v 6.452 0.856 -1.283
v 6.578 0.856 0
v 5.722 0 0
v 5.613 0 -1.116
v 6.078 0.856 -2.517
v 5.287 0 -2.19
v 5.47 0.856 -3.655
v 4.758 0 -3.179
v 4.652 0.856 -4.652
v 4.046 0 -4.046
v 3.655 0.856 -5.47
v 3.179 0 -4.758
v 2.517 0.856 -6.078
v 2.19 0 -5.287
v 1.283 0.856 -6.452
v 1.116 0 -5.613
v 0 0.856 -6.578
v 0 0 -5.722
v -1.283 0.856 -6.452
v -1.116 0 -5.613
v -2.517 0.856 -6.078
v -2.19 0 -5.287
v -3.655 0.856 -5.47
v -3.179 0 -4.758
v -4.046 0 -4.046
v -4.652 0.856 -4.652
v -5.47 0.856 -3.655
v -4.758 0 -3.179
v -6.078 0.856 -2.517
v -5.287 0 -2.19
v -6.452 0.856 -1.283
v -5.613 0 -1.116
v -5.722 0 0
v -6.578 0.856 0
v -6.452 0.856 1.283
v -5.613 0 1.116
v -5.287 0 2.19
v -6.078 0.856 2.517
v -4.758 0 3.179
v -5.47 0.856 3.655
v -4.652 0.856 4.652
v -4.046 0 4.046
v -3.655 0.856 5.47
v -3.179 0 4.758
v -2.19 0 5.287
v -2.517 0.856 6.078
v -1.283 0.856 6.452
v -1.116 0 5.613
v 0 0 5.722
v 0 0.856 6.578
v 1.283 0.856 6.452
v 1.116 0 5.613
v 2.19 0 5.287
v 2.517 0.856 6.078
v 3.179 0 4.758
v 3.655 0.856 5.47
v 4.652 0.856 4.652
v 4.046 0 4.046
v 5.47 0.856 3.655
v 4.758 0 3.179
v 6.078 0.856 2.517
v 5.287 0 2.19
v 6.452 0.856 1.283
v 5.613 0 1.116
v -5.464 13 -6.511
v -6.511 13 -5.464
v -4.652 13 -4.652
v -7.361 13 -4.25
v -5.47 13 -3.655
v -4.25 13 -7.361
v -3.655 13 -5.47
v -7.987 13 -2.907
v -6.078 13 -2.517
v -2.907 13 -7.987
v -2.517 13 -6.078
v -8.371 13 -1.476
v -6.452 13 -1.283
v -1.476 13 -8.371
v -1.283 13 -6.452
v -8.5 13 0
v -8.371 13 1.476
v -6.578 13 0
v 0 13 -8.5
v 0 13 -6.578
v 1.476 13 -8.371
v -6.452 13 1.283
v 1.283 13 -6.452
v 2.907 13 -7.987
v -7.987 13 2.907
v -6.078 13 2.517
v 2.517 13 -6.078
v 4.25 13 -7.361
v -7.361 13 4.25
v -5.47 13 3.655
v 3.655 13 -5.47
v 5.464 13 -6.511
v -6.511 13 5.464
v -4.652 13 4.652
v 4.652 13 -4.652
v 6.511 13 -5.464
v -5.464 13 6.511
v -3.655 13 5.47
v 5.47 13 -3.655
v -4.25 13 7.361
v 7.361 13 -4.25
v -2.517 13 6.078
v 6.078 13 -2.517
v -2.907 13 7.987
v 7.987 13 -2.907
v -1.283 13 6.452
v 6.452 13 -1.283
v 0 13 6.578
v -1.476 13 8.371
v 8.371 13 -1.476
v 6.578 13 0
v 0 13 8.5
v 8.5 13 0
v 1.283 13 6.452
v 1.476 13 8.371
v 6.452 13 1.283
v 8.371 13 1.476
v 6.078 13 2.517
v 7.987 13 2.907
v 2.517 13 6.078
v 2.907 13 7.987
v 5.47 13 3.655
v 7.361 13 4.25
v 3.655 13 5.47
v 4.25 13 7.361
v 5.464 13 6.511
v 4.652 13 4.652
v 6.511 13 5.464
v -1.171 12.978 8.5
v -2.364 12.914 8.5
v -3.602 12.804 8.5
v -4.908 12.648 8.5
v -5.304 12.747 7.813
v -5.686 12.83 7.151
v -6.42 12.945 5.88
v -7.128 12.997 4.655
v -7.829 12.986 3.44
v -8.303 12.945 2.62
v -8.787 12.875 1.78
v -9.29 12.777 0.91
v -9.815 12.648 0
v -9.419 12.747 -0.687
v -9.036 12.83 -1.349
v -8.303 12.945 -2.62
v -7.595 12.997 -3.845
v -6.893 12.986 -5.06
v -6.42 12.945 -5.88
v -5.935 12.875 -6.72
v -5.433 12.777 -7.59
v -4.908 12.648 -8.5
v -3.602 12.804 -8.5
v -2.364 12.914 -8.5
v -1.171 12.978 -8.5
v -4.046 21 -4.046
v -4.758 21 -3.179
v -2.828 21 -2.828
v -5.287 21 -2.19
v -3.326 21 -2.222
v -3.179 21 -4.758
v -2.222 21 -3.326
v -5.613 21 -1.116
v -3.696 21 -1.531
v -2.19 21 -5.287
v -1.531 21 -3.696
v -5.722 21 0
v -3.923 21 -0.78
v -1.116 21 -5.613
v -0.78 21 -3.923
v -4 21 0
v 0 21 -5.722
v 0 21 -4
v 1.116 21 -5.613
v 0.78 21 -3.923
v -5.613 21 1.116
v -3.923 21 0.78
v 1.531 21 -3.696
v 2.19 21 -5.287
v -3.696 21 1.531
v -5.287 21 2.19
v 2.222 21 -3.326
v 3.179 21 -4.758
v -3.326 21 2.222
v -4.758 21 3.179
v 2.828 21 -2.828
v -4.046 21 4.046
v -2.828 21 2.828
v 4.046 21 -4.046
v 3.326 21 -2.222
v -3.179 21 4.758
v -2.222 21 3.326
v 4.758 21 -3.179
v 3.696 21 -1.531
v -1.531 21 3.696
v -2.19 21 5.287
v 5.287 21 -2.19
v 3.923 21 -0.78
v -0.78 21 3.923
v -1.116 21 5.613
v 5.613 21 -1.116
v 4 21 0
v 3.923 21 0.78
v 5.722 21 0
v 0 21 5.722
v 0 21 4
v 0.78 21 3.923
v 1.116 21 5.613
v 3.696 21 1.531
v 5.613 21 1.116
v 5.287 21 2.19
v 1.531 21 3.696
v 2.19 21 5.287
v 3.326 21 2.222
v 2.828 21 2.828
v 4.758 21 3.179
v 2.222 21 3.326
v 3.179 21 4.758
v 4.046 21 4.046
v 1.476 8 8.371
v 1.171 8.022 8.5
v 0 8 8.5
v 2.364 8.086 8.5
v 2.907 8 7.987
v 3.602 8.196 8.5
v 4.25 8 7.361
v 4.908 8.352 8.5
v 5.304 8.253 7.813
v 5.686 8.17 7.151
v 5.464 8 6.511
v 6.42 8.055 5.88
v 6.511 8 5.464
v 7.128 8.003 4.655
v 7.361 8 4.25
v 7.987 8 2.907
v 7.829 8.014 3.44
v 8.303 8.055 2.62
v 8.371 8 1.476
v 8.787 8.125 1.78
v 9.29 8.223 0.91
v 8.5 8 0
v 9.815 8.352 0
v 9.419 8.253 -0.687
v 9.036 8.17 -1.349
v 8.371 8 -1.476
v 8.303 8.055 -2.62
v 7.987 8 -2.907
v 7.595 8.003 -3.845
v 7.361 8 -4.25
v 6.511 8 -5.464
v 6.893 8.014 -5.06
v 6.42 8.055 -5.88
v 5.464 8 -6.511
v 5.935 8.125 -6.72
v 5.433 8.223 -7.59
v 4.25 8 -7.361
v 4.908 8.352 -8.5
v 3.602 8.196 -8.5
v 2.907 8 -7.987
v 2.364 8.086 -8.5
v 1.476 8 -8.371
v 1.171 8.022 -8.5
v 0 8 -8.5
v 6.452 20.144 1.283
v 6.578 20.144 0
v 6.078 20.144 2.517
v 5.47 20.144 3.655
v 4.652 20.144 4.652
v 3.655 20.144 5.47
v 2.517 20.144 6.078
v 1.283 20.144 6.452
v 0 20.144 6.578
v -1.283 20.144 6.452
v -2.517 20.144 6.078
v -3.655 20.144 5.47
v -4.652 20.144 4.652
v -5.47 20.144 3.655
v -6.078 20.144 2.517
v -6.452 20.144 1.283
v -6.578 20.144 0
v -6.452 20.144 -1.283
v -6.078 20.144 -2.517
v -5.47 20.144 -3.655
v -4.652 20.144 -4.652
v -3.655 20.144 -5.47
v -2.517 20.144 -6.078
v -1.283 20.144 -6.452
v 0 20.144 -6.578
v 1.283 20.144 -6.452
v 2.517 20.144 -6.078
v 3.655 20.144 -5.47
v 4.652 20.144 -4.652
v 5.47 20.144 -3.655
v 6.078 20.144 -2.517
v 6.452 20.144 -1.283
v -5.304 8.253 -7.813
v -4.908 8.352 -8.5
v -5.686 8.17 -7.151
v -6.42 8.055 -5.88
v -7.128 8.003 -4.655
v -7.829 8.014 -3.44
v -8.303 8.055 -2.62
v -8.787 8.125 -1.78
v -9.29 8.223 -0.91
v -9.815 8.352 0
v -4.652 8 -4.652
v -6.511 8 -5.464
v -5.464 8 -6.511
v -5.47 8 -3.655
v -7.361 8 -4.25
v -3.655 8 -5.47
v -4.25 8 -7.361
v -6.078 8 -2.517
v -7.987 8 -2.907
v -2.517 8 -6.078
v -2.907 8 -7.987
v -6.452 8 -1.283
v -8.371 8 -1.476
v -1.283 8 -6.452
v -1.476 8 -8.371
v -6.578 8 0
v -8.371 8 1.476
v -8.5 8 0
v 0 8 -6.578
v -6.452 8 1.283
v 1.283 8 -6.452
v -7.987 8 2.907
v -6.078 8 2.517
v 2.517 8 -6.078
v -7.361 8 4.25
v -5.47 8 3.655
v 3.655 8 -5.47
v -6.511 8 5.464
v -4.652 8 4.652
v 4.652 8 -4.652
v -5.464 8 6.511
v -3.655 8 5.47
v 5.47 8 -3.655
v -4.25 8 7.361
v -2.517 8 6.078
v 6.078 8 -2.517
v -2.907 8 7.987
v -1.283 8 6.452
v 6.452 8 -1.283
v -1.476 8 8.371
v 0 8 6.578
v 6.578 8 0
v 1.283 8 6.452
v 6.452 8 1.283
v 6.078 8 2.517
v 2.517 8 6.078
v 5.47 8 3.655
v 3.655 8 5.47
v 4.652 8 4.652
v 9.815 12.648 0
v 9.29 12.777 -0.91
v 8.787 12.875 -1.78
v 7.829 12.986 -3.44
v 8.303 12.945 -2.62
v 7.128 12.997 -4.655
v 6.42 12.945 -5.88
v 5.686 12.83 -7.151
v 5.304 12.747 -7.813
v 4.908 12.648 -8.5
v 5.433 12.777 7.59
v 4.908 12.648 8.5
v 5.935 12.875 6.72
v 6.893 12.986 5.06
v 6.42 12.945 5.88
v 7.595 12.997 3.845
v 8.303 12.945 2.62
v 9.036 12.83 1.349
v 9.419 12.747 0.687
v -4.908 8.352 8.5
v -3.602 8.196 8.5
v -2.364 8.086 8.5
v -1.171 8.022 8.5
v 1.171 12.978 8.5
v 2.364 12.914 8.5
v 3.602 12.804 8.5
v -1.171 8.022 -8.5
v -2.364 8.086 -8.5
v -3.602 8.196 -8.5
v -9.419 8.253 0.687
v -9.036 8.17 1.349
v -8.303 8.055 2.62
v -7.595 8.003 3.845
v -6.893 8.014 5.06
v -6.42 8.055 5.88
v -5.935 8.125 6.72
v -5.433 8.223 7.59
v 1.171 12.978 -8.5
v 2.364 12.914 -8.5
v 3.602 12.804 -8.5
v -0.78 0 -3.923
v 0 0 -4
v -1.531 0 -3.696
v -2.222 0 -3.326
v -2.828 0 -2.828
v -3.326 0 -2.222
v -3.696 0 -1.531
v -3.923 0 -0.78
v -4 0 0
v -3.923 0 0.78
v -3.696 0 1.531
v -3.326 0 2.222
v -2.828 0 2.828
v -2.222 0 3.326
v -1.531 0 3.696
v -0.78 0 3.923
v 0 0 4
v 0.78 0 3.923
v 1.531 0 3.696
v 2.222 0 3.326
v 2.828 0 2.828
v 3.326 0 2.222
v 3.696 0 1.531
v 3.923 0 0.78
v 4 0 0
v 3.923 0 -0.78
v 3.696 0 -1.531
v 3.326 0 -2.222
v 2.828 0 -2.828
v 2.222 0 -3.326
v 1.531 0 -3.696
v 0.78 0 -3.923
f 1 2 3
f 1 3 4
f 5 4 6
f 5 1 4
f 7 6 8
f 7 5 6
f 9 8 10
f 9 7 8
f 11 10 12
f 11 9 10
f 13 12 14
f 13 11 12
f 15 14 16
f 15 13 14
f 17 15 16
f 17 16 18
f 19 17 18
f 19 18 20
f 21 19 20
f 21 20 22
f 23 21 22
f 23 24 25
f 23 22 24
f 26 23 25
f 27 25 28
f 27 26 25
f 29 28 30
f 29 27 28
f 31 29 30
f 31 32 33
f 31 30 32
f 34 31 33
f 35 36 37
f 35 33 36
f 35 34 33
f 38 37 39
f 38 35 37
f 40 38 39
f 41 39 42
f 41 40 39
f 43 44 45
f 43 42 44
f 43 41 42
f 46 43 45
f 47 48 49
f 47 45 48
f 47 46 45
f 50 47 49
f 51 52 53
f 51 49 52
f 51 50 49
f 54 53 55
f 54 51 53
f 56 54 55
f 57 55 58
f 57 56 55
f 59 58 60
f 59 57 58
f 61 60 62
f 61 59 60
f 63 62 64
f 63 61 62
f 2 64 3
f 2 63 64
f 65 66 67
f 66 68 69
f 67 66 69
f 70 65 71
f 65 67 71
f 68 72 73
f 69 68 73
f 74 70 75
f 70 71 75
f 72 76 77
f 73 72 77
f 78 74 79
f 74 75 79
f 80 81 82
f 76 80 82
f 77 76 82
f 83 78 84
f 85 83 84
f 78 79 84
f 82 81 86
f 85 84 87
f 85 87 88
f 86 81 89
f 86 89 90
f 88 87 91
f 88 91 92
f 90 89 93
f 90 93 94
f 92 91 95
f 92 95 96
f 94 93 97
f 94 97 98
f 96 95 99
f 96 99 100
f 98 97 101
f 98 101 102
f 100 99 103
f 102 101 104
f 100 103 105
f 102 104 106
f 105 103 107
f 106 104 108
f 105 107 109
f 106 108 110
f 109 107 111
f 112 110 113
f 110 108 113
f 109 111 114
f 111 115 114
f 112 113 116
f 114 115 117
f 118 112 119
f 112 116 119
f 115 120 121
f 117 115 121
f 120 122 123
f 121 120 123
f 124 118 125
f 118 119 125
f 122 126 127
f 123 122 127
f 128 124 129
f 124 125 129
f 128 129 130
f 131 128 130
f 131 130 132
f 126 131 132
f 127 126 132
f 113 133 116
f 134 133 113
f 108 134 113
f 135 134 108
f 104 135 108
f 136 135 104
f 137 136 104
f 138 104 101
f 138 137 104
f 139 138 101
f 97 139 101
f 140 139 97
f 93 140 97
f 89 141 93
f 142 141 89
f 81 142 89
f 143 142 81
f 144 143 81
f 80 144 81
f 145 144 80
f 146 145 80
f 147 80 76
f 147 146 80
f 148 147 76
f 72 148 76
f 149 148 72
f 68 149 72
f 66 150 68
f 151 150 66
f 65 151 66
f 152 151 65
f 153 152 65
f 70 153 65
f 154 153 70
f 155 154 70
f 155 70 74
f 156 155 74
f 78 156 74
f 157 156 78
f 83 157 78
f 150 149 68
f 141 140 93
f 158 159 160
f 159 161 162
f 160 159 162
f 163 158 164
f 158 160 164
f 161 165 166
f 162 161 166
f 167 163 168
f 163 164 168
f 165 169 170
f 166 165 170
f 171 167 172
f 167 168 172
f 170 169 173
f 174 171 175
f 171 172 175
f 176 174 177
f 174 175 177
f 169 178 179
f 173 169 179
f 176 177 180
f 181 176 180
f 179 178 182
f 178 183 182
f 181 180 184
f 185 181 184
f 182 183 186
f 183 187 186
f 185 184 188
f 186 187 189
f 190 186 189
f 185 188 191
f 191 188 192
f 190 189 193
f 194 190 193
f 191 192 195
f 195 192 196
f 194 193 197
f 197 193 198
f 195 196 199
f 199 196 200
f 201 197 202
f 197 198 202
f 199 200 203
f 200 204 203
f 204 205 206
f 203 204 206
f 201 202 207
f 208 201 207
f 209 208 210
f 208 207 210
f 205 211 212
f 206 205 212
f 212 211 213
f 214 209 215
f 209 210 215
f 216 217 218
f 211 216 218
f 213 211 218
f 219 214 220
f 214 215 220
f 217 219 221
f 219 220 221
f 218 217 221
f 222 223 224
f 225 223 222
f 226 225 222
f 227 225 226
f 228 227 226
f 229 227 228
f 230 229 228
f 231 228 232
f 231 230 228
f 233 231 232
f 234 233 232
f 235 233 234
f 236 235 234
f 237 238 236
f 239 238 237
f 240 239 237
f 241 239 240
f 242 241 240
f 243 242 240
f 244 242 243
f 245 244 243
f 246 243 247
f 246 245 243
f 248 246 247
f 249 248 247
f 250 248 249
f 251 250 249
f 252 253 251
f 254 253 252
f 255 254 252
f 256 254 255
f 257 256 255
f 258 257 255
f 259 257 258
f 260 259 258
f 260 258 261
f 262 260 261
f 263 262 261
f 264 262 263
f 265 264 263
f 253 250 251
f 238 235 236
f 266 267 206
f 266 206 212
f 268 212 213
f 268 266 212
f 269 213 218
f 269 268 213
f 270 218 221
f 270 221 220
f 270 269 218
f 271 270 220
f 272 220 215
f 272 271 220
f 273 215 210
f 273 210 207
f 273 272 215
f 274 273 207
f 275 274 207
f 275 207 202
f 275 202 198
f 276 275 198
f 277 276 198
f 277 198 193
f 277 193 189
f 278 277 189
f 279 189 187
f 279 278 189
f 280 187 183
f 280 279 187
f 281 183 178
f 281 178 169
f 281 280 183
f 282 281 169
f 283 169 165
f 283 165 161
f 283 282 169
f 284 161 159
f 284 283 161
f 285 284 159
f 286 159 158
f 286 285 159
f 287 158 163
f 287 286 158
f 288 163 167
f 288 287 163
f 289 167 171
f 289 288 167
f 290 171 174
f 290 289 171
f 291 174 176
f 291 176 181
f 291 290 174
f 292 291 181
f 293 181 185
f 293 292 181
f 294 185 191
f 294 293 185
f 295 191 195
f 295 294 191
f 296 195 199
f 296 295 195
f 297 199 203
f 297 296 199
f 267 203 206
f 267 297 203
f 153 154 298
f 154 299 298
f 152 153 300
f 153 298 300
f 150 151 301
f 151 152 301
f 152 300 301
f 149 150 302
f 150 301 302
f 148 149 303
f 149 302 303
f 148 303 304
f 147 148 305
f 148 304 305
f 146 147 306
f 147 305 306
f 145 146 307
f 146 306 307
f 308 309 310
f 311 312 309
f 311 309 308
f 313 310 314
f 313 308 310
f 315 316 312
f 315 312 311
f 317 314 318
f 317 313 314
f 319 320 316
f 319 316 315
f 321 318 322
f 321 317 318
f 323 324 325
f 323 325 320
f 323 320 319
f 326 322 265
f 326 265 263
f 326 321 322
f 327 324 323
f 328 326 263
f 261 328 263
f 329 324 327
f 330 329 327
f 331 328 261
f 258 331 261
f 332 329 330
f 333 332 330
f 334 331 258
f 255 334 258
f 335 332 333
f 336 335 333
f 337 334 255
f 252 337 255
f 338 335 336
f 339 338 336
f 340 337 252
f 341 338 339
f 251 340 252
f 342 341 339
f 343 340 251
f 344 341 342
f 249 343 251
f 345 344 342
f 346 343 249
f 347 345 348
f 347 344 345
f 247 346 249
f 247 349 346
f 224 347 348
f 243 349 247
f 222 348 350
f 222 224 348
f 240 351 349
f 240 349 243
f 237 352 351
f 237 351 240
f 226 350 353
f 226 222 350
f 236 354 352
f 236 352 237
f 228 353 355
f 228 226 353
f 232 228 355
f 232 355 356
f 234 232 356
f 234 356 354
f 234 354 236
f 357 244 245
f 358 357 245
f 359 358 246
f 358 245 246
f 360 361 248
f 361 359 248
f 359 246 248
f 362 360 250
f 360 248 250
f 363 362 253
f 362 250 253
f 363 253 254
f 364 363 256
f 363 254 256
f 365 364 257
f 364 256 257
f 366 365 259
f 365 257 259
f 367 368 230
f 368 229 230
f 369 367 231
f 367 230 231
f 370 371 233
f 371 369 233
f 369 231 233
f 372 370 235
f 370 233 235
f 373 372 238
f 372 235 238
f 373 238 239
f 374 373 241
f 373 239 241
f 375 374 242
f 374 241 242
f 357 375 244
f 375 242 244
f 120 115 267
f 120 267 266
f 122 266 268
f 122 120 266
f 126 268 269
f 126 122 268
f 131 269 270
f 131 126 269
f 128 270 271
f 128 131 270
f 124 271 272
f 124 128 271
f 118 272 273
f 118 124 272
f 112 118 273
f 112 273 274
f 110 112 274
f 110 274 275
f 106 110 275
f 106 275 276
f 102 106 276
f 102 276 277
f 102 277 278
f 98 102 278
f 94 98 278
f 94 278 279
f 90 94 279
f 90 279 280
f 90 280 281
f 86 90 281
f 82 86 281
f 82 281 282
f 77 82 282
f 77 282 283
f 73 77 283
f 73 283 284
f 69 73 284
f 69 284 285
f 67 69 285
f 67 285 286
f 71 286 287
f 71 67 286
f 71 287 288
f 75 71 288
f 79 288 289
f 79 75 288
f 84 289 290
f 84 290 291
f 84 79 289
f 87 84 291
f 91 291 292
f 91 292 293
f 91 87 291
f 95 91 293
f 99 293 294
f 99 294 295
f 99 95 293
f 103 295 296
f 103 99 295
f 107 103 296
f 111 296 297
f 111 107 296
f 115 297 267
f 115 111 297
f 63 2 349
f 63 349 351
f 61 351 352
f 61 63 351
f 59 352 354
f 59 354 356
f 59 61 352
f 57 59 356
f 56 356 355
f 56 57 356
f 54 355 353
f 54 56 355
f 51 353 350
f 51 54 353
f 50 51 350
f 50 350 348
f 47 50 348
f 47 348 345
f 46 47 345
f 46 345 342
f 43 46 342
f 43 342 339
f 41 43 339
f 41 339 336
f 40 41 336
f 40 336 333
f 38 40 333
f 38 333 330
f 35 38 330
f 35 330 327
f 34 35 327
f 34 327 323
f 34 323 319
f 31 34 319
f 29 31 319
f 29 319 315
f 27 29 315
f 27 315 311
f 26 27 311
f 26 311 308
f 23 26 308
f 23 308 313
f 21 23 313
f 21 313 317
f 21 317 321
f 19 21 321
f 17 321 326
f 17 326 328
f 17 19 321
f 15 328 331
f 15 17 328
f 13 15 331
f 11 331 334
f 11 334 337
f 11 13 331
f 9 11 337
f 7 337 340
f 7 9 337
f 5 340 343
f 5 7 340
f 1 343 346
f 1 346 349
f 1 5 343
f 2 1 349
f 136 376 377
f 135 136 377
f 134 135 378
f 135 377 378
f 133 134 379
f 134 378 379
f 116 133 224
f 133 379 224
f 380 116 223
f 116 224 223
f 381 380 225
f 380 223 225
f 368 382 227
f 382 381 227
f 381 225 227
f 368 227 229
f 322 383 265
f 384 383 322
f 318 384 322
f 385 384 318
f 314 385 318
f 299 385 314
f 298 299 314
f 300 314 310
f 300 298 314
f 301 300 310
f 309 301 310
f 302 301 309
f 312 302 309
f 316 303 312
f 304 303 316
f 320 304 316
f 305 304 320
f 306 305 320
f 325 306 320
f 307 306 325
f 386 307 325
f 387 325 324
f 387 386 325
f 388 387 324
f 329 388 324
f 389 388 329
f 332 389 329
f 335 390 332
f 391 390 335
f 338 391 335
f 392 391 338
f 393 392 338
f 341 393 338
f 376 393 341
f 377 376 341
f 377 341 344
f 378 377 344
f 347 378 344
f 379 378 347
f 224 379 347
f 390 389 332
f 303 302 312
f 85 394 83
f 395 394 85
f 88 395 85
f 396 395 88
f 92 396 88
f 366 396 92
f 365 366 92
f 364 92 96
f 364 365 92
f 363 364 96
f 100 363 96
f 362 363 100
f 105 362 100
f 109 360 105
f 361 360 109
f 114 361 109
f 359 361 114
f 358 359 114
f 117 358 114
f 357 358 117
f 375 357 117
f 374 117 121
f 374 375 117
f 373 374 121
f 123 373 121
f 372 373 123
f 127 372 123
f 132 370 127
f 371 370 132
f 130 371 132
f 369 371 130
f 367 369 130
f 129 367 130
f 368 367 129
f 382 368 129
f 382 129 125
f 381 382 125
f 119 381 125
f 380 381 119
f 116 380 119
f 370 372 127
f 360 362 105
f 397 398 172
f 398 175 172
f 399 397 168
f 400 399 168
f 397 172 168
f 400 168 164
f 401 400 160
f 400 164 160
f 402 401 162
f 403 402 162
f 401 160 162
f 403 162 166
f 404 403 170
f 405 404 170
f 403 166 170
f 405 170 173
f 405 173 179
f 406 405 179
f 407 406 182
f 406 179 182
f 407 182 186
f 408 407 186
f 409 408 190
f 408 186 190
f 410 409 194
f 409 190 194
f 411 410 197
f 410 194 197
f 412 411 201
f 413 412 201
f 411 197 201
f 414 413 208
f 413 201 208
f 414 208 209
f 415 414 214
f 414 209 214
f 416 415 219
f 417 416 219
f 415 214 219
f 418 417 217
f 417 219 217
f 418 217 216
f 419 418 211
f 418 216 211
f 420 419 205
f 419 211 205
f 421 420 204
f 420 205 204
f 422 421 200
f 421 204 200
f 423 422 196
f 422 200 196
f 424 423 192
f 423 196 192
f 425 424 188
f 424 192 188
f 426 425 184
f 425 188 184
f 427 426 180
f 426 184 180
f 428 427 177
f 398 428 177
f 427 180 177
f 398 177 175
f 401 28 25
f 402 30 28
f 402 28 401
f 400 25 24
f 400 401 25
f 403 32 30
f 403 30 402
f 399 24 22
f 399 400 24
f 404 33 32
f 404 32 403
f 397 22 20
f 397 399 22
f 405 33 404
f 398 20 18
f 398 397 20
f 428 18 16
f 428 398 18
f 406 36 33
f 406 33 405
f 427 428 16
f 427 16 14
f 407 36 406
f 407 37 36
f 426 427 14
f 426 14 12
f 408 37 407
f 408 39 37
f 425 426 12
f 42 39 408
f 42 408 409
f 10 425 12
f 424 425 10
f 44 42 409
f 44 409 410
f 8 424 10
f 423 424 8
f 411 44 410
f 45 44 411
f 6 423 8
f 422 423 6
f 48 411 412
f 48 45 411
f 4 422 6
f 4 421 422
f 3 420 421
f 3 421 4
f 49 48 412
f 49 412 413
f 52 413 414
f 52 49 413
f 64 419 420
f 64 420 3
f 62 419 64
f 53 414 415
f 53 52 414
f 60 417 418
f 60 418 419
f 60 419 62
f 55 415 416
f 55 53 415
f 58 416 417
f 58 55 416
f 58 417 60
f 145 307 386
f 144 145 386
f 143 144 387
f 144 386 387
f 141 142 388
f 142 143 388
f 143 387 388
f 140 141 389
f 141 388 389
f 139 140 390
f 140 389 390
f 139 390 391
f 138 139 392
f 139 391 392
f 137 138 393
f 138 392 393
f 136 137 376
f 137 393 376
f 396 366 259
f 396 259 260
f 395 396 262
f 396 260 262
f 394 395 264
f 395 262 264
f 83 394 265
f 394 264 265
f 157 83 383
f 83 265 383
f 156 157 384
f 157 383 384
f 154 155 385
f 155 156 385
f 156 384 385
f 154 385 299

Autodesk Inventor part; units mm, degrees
sketch "Sketch_6" plane through (0, 0, 0) normal (0, 0, 1) x (1, 0, 0)
  line L0 (0, 0) -> (0, 13)
  line L1 (0, 13) -> (8.5, 13)
  line L2 (8.5, 13) -> (10.2, 12.5445)
  line L3 (10.2, 12.5445) -> (10.2, 8.4555)
  line L4 (10.2, 8.4555) -> (8.5, 8)
  line L5 (8.5, 8) -> (6.5785, 8)
  line L6 (6.5785, 8) -> (6.5785, 0.856)
  line L7 (6.5785, 0.856) -> (5.7225, 0)
  line L8 (5.7225, 0) -> (0, 0)
  line L9 (0, 0) -> (0, 13)
revolve "Revolution1" add sketch "Sketch_6" angle 360 about axis through (0, 0, 0) along (0, -1, 0)
thread "Thread1" size "G13.157x1.337" designation "G 1/4" class "A" standard "ISO Pipe Threads" length 5.544
sketch "Sketch_7" plane through (0, 0, 0) normal (0, 0, 1) x (1, 0, 0)
  line L0 (0, 13) -> (0, 21)
  line L1 (0, 21) -> (5.7225, 21)
  line L2 (5.7225, 21) -> (6.5785, 20.144)
  line L3 (6.5785, 20.144) -> (6.5785, 13)
  line L4 (6.5785, 13) -> (0, 13)
  line L5 (0, 13) -> (0, 21)
revolve "Revolution2" add sketch "Sketch_7" angle 360 about axis through (0, 13, 0) along (0, -1, 0)
thread "Thread2" size "G13.157x1.337" designation "G 1/4" class "A" standard "ISO Pipe Threads" length 5.544
sketch "Sketch_10" plane through (0, 10.5, 0) normal (0, 1, 0) x (1, 0, 0)
  line L0 (-17, -17) -> (17, -17)
  line L1 (17, -17) -> (17, 17)
  line L2 (17, 17) -> (-17, 17)
  line L3 (-17, 17) -> (-17, -17)
  line L4 (-9.815, 0) -> (-4.9075, -8.5)
  line L5 (-4.9075, -8.5) -> (4.9075, -8.5)
  line L6 (4.9075, -8.5) -> (9.815, 0)
  line L7 (9.815, 0) -> (4.9075, 8.5)
  line L8 (4.9075, 8.5) -> (-4.9075, 8.5)
  line L9 (-4.9075, 8.5) -> (-9.815, 0)
extrude "Extrusion1" cut sketch "Sketch_10" along normal mid plane 12.6
sketch "Sketch4" plane through (0, 0, 0) normal (0, -1, 0) x (1, 0, 0)
  point P0 (0, 0)
hole "Hole1" at (0, 0, 0) direction (0, 1, 0) diameter 8 depth 21
ref_plane "IP1_XY" through (0, 0, 0) normal (0, 1, 0) x (1, 0, 0)
ref_plane "IP1_YZ" through (0, 0, 0) normal (1, 0, 0) x (0, 0, -1)
ref_plane "IP1_ZX" through (0, 0, 0) normal (0, 0, -1) x (0, 1, 0)
ref_plane "IP2_XY" through (0, 21, 0) normal (0, -1, 0) x (1, 0, 0)
ref_plane "IP2_YZ" through (0, 21, 0) normal (1, 0, 0) x (0, 0, 1)
ref_plane "IP2_ZX" through (0, 21, 0) normal (0, 0, 1) x (0, -1, 0)
ref_plane "RING1_XY" through (0, 8, 0) normal (0, 1, 0) x (1, 0, 0)
ref_plane "RING1_YZ" through (0, 8, 0) normal (1, 0, 0) x (0, 0, -1)
ref_plane "RING1_ZX" through (0, 8, 0) normal (0, 0, -1) x (0, 1, 0)
ref_plane "RING2_XY" through (0, 13, 0) normal (0, -1, 0) x (1, 0, 0)
ref_plane "RING2_YZ" through (0, 13, 0) normal (1, 0, 0) x (0, 0, 1)
ref_plane "RING2_ZX" through (0, 13, 0) normal (0, 0, 1) x (0, -1, 0)
properties part number "8030272 NPFC-D-2G14-M"
